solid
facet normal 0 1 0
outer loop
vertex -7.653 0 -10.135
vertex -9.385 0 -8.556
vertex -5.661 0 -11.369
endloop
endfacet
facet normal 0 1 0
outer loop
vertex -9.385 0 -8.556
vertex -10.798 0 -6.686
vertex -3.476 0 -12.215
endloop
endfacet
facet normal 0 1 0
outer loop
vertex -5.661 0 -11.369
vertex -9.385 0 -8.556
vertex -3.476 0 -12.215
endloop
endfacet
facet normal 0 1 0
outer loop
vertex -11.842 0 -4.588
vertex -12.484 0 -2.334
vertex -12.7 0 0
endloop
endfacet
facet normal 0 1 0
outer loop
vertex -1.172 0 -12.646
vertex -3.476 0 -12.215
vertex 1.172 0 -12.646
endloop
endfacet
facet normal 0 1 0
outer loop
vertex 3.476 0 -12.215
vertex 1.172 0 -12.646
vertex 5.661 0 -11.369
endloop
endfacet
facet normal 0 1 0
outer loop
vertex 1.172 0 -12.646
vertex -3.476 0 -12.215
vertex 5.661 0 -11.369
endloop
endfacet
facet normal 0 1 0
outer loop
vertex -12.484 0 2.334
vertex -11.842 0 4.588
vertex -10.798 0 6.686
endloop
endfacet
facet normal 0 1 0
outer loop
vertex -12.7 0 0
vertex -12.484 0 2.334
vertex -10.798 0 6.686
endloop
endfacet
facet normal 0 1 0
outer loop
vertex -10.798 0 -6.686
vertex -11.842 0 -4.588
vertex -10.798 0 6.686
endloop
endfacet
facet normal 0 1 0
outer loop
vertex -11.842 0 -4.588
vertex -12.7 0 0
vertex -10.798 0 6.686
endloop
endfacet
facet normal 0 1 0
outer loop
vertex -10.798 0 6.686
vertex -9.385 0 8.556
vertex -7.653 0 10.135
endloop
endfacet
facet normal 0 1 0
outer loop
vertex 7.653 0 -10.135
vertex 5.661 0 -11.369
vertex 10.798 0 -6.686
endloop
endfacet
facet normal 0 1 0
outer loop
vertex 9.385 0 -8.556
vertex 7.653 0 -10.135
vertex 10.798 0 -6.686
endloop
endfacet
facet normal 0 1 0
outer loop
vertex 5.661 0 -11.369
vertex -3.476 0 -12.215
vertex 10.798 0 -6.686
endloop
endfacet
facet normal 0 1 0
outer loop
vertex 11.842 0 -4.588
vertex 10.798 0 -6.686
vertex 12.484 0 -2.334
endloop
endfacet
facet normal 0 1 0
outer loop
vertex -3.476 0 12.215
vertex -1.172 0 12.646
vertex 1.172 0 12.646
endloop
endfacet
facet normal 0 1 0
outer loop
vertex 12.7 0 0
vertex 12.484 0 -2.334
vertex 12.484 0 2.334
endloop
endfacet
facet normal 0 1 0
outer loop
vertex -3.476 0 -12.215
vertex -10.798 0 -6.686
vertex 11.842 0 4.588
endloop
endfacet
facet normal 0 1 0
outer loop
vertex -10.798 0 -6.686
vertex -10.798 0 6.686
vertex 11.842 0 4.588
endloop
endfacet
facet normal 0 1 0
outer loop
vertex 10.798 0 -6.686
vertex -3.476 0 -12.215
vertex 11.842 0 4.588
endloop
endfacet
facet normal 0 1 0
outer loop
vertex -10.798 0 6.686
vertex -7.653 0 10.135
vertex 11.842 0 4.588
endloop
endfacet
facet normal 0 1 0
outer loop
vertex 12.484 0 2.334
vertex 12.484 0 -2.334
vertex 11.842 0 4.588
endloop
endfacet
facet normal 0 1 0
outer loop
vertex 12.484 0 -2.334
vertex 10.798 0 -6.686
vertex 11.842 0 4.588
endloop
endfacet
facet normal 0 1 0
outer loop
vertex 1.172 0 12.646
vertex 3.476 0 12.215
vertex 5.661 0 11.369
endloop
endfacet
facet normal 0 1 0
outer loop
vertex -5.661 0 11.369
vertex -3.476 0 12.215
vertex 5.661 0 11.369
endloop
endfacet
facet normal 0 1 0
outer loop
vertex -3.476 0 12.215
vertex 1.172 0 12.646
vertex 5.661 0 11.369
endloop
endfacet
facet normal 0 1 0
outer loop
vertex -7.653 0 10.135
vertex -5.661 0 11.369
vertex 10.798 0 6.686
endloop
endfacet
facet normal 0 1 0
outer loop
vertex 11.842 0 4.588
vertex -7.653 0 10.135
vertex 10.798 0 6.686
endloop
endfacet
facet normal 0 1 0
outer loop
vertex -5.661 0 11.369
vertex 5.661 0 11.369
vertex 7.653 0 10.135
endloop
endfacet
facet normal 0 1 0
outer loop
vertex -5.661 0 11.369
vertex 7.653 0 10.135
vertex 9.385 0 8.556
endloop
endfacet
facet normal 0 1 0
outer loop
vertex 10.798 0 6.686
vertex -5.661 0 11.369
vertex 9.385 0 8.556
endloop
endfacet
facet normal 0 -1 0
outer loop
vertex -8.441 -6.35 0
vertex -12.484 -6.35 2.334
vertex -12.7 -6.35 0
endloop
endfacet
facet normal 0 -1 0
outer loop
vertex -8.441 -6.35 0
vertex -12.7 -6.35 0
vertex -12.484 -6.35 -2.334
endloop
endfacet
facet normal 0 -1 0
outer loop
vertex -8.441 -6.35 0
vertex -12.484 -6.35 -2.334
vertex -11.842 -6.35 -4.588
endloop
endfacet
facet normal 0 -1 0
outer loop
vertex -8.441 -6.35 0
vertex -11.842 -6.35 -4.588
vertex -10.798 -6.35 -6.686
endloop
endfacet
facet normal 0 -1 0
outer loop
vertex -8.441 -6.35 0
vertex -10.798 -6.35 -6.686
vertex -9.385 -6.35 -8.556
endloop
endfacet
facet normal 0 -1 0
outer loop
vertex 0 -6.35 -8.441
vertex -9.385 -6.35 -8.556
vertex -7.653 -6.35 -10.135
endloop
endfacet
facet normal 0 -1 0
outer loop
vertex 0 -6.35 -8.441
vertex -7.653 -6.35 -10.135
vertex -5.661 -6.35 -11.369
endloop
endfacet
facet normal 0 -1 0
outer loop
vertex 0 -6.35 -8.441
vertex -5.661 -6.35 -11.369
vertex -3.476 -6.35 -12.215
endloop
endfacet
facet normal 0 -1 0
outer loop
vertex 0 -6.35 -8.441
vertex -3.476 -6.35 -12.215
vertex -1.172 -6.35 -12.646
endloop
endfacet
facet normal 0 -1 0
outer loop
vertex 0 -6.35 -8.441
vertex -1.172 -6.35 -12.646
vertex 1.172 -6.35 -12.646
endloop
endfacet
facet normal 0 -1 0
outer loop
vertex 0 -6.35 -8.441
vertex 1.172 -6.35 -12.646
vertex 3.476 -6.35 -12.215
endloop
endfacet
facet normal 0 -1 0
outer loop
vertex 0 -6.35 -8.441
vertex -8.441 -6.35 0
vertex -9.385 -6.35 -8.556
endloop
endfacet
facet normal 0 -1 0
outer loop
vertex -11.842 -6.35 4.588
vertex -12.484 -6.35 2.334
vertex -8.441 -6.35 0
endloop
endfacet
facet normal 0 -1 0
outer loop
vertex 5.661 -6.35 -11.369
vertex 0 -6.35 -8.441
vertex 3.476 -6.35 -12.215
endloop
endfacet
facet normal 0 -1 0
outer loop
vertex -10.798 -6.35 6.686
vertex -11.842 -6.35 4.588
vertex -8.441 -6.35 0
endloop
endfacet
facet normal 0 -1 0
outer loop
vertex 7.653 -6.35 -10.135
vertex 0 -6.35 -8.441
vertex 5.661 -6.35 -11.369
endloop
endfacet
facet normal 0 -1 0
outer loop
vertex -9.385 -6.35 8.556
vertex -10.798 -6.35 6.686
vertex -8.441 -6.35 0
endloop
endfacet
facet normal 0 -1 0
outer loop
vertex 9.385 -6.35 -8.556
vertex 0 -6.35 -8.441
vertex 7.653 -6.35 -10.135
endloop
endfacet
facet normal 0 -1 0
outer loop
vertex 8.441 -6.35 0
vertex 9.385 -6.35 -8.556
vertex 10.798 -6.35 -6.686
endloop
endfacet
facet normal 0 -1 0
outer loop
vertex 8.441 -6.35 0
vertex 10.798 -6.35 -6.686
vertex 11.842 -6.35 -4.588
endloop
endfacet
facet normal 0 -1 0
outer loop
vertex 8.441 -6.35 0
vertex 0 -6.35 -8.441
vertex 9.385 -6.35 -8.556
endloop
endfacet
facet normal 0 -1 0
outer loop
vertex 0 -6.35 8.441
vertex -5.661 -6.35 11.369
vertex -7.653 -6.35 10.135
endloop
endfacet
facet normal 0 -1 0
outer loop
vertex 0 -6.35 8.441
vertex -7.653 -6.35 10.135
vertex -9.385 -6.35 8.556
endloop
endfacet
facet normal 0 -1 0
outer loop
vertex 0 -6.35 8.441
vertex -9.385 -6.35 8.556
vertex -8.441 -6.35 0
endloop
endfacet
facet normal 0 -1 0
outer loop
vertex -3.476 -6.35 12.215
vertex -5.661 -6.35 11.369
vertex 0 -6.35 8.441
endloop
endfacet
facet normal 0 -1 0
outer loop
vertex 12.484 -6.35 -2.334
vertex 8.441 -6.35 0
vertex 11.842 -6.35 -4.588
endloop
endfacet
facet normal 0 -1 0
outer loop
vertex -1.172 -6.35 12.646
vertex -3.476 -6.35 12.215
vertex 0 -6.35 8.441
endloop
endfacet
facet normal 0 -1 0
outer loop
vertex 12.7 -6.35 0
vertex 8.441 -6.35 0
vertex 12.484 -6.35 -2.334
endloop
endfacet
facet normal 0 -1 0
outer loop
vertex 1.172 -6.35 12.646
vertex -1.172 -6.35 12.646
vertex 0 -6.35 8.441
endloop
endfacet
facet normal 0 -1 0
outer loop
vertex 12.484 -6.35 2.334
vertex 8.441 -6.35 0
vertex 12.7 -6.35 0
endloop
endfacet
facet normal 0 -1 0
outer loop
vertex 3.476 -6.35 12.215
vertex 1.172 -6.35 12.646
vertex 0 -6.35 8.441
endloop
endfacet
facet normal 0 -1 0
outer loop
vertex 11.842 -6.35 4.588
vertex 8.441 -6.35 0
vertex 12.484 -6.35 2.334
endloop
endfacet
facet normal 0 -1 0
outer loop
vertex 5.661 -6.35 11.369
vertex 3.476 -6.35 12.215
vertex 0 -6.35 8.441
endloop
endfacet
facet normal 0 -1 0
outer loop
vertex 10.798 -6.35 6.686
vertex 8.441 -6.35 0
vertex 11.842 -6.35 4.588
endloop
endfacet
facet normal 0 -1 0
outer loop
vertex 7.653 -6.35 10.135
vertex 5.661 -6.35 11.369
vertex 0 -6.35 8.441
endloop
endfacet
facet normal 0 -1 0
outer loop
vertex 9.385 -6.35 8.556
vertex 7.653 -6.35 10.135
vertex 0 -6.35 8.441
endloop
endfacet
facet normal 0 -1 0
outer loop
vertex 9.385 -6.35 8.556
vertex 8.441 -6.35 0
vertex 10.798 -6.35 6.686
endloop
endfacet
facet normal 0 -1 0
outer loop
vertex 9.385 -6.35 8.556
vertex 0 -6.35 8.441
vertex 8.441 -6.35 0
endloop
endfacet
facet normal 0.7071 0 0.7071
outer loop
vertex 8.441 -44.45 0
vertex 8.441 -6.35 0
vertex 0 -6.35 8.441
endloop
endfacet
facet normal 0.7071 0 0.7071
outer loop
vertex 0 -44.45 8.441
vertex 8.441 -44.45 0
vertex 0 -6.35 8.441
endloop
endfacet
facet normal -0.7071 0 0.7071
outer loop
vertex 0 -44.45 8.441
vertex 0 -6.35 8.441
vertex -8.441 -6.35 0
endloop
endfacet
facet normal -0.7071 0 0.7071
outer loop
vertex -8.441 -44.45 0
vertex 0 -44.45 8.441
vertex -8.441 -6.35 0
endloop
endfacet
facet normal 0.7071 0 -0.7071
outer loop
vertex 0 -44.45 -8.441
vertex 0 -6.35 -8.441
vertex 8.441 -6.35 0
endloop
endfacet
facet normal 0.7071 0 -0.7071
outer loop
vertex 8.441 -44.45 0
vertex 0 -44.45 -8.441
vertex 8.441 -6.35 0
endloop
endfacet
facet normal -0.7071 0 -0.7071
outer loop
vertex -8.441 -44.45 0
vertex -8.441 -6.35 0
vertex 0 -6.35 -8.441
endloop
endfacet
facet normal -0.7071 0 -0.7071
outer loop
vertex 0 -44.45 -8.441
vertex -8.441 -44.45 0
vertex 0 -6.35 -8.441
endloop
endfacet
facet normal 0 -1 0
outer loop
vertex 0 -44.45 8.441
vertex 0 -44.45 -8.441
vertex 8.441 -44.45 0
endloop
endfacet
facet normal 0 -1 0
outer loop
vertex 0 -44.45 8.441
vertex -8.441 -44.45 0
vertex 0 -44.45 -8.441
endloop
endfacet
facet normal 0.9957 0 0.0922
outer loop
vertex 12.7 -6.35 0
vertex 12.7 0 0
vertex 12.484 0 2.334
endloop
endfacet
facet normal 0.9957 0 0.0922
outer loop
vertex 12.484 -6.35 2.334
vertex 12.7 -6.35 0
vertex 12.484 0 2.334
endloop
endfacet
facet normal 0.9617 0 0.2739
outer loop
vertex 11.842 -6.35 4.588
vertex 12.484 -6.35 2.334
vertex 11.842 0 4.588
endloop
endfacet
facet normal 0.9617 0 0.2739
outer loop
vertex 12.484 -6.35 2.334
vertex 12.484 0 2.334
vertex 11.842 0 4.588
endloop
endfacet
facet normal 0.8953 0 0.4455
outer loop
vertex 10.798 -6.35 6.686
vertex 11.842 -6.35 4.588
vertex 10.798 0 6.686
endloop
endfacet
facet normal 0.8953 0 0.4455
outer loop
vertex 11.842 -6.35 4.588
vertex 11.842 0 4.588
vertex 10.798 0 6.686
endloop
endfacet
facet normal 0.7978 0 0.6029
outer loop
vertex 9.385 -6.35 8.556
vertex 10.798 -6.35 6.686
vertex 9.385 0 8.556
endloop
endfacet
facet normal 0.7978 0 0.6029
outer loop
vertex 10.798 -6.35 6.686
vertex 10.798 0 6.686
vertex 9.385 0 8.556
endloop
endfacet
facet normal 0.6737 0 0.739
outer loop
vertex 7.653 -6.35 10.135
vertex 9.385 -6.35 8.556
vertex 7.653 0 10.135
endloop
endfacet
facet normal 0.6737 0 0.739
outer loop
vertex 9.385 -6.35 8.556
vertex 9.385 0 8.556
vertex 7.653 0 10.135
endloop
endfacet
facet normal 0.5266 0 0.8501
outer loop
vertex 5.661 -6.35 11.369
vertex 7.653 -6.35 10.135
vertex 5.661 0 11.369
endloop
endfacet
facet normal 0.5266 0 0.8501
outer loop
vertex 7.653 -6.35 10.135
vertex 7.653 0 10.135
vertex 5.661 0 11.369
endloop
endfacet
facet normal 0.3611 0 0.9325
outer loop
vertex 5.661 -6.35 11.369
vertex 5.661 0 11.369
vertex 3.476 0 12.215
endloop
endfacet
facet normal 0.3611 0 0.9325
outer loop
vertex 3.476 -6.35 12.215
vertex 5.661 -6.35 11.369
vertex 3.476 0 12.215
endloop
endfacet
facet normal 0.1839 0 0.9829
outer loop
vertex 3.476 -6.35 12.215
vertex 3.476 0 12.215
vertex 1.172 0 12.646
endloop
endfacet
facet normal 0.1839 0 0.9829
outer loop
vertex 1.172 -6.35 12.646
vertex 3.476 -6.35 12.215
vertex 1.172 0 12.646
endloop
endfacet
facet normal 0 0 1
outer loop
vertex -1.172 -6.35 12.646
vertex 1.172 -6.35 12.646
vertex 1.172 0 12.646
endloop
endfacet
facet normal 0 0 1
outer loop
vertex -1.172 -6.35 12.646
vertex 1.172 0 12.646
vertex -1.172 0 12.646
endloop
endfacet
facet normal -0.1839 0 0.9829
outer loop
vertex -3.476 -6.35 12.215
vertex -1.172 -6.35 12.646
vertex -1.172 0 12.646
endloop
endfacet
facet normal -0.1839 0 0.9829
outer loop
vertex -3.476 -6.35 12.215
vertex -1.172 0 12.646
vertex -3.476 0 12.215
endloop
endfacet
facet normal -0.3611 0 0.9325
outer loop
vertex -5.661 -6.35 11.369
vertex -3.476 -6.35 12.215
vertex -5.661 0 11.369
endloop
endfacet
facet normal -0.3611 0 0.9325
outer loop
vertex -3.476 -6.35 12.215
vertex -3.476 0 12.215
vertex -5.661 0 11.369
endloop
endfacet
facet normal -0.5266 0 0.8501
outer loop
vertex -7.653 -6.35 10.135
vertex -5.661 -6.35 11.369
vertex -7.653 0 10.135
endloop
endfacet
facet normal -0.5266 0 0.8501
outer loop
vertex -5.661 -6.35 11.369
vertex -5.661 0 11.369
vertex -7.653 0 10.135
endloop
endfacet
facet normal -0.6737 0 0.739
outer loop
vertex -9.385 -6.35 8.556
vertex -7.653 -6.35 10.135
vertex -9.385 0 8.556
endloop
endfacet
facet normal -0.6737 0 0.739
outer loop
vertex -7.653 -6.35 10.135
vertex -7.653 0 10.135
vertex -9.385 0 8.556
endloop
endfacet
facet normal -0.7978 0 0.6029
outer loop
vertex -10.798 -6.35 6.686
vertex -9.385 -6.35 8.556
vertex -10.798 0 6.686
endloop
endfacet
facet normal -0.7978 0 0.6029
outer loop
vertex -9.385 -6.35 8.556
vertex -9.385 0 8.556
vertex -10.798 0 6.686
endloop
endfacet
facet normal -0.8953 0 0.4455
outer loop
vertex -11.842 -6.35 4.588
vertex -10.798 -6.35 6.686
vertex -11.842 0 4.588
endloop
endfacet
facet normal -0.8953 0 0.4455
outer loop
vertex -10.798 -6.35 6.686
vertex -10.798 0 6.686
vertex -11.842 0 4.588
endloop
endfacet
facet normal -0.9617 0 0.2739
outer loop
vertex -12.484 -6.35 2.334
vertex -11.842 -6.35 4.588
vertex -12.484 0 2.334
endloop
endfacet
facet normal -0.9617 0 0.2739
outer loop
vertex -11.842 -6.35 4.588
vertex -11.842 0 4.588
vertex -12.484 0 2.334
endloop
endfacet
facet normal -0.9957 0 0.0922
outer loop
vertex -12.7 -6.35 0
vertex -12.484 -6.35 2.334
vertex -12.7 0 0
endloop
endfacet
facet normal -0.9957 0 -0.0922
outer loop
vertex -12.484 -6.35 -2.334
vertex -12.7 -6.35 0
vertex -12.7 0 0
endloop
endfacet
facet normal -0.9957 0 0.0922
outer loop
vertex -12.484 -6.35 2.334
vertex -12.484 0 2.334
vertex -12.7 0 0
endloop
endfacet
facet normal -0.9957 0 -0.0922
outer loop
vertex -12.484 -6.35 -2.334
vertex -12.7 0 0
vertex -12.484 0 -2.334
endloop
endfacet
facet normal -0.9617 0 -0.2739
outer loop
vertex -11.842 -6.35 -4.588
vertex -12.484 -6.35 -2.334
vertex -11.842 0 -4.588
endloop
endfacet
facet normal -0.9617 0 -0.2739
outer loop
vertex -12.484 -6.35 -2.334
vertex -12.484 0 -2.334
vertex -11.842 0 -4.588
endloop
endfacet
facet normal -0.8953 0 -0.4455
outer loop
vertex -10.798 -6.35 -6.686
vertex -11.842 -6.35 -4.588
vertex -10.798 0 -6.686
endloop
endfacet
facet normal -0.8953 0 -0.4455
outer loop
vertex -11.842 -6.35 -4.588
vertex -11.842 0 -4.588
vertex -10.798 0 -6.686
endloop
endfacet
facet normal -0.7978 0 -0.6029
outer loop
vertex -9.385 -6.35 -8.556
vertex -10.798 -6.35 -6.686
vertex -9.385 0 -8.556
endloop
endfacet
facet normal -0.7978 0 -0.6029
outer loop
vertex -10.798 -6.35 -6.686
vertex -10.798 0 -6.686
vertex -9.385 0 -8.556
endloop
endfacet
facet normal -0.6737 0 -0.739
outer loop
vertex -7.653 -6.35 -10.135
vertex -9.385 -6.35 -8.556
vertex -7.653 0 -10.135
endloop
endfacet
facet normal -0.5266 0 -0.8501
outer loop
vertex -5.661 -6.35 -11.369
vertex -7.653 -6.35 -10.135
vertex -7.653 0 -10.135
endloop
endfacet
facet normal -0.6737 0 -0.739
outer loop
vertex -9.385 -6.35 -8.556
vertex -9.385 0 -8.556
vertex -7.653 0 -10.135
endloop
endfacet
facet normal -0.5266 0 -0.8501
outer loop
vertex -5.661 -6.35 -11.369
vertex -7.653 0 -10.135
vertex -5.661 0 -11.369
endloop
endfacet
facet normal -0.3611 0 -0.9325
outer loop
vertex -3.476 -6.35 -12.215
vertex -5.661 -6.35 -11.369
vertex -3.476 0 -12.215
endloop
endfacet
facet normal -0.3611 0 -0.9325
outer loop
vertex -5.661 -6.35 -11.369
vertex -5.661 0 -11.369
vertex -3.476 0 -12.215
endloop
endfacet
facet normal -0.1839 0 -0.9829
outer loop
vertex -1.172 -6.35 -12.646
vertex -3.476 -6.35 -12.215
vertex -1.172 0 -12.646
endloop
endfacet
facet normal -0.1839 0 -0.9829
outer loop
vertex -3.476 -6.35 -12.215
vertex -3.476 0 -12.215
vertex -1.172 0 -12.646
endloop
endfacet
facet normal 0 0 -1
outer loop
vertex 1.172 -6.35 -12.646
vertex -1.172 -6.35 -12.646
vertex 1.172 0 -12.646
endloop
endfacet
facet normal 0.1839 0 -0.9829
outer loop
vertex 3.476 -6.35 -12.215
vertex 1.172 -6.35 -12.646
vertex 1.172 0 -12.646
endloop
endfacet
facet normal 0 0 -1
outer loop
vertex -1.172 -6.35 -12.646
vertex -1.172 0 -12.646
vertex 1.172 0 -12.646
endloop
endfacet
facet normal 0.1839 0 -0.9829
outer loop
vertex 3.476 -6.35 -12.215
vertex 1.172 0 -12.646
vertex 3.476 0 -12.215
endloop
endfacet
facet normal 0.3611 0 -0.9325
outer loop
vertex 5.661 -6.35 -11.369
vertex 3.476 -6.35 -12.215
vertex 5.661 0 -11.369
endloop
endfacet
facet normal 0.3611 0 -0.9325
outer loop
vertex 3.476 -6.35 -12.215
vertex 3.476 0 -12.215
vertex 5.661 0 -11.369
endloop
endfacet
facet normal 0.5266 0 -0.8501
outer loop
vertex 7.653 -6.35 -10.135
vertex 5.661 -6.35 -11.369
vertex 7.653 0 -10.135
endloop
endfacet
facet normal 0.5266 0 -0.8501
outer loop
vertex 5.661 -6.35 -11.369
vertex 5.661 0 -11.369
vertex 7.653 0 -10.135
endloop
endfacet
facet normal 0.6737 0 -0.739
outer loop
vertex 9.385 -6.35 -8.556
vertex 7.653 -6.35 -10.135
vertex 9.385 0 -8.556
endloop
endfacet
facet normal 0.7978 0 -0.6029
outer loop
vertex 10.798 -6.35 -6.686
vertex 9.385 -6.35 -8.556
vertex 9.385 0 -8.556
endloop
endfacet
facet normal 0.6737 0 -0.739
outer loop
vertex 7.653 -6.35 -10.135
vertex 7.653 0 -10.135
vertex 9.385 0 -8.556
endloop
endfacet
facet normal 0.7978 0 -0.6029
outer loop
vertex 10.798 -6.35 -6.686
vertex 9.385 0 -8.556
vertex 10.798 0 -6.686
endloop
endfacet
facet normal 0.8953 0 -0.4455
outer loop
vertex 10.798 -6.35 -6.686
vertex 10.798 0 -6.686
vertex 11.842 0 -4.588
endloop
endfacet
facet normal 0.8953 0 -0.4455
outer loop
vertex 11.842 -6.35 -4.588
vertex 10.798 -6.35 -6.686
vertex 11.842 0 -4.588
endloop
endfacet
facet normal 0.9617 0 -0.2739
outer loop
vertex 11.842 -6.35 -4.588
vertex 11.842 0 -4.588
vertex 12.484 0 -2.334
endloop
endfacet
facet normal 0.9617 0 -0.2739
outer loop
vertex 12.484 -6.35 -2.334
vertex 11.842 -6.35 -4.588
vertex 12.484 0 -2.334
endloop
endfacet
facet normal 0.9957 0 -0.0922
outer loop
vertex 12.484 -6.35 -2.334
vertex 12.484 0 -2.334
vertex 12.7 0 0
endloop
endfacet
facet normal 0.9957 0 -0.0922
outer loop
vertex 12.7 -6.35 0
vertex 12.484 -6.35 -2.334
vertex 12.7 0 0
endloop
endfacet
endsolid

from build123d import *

# Parameters (mm, degrees)
F0_R     = 12.7
F1_DEPTH = 6.35
F3_DEPTH = 38.1


with BuildPart() as f1:
    # F0 (on Front) → F1 (new body)
    with BuildSketch(Plane.XZ):
        Circle(F0_R)
    extrude(amount=F1_DEPTH)

    # F2 (on face) → F3 (join)
    with BuildSketch(Plane.XZ.offset(6.35)):
        Polygon((0, -8.441441), (8.441441, 0), (0, 8.441441), (-8.441441, 0), align=None)
    extrude(amount=F3_DEPTH)


solid = f1.part
